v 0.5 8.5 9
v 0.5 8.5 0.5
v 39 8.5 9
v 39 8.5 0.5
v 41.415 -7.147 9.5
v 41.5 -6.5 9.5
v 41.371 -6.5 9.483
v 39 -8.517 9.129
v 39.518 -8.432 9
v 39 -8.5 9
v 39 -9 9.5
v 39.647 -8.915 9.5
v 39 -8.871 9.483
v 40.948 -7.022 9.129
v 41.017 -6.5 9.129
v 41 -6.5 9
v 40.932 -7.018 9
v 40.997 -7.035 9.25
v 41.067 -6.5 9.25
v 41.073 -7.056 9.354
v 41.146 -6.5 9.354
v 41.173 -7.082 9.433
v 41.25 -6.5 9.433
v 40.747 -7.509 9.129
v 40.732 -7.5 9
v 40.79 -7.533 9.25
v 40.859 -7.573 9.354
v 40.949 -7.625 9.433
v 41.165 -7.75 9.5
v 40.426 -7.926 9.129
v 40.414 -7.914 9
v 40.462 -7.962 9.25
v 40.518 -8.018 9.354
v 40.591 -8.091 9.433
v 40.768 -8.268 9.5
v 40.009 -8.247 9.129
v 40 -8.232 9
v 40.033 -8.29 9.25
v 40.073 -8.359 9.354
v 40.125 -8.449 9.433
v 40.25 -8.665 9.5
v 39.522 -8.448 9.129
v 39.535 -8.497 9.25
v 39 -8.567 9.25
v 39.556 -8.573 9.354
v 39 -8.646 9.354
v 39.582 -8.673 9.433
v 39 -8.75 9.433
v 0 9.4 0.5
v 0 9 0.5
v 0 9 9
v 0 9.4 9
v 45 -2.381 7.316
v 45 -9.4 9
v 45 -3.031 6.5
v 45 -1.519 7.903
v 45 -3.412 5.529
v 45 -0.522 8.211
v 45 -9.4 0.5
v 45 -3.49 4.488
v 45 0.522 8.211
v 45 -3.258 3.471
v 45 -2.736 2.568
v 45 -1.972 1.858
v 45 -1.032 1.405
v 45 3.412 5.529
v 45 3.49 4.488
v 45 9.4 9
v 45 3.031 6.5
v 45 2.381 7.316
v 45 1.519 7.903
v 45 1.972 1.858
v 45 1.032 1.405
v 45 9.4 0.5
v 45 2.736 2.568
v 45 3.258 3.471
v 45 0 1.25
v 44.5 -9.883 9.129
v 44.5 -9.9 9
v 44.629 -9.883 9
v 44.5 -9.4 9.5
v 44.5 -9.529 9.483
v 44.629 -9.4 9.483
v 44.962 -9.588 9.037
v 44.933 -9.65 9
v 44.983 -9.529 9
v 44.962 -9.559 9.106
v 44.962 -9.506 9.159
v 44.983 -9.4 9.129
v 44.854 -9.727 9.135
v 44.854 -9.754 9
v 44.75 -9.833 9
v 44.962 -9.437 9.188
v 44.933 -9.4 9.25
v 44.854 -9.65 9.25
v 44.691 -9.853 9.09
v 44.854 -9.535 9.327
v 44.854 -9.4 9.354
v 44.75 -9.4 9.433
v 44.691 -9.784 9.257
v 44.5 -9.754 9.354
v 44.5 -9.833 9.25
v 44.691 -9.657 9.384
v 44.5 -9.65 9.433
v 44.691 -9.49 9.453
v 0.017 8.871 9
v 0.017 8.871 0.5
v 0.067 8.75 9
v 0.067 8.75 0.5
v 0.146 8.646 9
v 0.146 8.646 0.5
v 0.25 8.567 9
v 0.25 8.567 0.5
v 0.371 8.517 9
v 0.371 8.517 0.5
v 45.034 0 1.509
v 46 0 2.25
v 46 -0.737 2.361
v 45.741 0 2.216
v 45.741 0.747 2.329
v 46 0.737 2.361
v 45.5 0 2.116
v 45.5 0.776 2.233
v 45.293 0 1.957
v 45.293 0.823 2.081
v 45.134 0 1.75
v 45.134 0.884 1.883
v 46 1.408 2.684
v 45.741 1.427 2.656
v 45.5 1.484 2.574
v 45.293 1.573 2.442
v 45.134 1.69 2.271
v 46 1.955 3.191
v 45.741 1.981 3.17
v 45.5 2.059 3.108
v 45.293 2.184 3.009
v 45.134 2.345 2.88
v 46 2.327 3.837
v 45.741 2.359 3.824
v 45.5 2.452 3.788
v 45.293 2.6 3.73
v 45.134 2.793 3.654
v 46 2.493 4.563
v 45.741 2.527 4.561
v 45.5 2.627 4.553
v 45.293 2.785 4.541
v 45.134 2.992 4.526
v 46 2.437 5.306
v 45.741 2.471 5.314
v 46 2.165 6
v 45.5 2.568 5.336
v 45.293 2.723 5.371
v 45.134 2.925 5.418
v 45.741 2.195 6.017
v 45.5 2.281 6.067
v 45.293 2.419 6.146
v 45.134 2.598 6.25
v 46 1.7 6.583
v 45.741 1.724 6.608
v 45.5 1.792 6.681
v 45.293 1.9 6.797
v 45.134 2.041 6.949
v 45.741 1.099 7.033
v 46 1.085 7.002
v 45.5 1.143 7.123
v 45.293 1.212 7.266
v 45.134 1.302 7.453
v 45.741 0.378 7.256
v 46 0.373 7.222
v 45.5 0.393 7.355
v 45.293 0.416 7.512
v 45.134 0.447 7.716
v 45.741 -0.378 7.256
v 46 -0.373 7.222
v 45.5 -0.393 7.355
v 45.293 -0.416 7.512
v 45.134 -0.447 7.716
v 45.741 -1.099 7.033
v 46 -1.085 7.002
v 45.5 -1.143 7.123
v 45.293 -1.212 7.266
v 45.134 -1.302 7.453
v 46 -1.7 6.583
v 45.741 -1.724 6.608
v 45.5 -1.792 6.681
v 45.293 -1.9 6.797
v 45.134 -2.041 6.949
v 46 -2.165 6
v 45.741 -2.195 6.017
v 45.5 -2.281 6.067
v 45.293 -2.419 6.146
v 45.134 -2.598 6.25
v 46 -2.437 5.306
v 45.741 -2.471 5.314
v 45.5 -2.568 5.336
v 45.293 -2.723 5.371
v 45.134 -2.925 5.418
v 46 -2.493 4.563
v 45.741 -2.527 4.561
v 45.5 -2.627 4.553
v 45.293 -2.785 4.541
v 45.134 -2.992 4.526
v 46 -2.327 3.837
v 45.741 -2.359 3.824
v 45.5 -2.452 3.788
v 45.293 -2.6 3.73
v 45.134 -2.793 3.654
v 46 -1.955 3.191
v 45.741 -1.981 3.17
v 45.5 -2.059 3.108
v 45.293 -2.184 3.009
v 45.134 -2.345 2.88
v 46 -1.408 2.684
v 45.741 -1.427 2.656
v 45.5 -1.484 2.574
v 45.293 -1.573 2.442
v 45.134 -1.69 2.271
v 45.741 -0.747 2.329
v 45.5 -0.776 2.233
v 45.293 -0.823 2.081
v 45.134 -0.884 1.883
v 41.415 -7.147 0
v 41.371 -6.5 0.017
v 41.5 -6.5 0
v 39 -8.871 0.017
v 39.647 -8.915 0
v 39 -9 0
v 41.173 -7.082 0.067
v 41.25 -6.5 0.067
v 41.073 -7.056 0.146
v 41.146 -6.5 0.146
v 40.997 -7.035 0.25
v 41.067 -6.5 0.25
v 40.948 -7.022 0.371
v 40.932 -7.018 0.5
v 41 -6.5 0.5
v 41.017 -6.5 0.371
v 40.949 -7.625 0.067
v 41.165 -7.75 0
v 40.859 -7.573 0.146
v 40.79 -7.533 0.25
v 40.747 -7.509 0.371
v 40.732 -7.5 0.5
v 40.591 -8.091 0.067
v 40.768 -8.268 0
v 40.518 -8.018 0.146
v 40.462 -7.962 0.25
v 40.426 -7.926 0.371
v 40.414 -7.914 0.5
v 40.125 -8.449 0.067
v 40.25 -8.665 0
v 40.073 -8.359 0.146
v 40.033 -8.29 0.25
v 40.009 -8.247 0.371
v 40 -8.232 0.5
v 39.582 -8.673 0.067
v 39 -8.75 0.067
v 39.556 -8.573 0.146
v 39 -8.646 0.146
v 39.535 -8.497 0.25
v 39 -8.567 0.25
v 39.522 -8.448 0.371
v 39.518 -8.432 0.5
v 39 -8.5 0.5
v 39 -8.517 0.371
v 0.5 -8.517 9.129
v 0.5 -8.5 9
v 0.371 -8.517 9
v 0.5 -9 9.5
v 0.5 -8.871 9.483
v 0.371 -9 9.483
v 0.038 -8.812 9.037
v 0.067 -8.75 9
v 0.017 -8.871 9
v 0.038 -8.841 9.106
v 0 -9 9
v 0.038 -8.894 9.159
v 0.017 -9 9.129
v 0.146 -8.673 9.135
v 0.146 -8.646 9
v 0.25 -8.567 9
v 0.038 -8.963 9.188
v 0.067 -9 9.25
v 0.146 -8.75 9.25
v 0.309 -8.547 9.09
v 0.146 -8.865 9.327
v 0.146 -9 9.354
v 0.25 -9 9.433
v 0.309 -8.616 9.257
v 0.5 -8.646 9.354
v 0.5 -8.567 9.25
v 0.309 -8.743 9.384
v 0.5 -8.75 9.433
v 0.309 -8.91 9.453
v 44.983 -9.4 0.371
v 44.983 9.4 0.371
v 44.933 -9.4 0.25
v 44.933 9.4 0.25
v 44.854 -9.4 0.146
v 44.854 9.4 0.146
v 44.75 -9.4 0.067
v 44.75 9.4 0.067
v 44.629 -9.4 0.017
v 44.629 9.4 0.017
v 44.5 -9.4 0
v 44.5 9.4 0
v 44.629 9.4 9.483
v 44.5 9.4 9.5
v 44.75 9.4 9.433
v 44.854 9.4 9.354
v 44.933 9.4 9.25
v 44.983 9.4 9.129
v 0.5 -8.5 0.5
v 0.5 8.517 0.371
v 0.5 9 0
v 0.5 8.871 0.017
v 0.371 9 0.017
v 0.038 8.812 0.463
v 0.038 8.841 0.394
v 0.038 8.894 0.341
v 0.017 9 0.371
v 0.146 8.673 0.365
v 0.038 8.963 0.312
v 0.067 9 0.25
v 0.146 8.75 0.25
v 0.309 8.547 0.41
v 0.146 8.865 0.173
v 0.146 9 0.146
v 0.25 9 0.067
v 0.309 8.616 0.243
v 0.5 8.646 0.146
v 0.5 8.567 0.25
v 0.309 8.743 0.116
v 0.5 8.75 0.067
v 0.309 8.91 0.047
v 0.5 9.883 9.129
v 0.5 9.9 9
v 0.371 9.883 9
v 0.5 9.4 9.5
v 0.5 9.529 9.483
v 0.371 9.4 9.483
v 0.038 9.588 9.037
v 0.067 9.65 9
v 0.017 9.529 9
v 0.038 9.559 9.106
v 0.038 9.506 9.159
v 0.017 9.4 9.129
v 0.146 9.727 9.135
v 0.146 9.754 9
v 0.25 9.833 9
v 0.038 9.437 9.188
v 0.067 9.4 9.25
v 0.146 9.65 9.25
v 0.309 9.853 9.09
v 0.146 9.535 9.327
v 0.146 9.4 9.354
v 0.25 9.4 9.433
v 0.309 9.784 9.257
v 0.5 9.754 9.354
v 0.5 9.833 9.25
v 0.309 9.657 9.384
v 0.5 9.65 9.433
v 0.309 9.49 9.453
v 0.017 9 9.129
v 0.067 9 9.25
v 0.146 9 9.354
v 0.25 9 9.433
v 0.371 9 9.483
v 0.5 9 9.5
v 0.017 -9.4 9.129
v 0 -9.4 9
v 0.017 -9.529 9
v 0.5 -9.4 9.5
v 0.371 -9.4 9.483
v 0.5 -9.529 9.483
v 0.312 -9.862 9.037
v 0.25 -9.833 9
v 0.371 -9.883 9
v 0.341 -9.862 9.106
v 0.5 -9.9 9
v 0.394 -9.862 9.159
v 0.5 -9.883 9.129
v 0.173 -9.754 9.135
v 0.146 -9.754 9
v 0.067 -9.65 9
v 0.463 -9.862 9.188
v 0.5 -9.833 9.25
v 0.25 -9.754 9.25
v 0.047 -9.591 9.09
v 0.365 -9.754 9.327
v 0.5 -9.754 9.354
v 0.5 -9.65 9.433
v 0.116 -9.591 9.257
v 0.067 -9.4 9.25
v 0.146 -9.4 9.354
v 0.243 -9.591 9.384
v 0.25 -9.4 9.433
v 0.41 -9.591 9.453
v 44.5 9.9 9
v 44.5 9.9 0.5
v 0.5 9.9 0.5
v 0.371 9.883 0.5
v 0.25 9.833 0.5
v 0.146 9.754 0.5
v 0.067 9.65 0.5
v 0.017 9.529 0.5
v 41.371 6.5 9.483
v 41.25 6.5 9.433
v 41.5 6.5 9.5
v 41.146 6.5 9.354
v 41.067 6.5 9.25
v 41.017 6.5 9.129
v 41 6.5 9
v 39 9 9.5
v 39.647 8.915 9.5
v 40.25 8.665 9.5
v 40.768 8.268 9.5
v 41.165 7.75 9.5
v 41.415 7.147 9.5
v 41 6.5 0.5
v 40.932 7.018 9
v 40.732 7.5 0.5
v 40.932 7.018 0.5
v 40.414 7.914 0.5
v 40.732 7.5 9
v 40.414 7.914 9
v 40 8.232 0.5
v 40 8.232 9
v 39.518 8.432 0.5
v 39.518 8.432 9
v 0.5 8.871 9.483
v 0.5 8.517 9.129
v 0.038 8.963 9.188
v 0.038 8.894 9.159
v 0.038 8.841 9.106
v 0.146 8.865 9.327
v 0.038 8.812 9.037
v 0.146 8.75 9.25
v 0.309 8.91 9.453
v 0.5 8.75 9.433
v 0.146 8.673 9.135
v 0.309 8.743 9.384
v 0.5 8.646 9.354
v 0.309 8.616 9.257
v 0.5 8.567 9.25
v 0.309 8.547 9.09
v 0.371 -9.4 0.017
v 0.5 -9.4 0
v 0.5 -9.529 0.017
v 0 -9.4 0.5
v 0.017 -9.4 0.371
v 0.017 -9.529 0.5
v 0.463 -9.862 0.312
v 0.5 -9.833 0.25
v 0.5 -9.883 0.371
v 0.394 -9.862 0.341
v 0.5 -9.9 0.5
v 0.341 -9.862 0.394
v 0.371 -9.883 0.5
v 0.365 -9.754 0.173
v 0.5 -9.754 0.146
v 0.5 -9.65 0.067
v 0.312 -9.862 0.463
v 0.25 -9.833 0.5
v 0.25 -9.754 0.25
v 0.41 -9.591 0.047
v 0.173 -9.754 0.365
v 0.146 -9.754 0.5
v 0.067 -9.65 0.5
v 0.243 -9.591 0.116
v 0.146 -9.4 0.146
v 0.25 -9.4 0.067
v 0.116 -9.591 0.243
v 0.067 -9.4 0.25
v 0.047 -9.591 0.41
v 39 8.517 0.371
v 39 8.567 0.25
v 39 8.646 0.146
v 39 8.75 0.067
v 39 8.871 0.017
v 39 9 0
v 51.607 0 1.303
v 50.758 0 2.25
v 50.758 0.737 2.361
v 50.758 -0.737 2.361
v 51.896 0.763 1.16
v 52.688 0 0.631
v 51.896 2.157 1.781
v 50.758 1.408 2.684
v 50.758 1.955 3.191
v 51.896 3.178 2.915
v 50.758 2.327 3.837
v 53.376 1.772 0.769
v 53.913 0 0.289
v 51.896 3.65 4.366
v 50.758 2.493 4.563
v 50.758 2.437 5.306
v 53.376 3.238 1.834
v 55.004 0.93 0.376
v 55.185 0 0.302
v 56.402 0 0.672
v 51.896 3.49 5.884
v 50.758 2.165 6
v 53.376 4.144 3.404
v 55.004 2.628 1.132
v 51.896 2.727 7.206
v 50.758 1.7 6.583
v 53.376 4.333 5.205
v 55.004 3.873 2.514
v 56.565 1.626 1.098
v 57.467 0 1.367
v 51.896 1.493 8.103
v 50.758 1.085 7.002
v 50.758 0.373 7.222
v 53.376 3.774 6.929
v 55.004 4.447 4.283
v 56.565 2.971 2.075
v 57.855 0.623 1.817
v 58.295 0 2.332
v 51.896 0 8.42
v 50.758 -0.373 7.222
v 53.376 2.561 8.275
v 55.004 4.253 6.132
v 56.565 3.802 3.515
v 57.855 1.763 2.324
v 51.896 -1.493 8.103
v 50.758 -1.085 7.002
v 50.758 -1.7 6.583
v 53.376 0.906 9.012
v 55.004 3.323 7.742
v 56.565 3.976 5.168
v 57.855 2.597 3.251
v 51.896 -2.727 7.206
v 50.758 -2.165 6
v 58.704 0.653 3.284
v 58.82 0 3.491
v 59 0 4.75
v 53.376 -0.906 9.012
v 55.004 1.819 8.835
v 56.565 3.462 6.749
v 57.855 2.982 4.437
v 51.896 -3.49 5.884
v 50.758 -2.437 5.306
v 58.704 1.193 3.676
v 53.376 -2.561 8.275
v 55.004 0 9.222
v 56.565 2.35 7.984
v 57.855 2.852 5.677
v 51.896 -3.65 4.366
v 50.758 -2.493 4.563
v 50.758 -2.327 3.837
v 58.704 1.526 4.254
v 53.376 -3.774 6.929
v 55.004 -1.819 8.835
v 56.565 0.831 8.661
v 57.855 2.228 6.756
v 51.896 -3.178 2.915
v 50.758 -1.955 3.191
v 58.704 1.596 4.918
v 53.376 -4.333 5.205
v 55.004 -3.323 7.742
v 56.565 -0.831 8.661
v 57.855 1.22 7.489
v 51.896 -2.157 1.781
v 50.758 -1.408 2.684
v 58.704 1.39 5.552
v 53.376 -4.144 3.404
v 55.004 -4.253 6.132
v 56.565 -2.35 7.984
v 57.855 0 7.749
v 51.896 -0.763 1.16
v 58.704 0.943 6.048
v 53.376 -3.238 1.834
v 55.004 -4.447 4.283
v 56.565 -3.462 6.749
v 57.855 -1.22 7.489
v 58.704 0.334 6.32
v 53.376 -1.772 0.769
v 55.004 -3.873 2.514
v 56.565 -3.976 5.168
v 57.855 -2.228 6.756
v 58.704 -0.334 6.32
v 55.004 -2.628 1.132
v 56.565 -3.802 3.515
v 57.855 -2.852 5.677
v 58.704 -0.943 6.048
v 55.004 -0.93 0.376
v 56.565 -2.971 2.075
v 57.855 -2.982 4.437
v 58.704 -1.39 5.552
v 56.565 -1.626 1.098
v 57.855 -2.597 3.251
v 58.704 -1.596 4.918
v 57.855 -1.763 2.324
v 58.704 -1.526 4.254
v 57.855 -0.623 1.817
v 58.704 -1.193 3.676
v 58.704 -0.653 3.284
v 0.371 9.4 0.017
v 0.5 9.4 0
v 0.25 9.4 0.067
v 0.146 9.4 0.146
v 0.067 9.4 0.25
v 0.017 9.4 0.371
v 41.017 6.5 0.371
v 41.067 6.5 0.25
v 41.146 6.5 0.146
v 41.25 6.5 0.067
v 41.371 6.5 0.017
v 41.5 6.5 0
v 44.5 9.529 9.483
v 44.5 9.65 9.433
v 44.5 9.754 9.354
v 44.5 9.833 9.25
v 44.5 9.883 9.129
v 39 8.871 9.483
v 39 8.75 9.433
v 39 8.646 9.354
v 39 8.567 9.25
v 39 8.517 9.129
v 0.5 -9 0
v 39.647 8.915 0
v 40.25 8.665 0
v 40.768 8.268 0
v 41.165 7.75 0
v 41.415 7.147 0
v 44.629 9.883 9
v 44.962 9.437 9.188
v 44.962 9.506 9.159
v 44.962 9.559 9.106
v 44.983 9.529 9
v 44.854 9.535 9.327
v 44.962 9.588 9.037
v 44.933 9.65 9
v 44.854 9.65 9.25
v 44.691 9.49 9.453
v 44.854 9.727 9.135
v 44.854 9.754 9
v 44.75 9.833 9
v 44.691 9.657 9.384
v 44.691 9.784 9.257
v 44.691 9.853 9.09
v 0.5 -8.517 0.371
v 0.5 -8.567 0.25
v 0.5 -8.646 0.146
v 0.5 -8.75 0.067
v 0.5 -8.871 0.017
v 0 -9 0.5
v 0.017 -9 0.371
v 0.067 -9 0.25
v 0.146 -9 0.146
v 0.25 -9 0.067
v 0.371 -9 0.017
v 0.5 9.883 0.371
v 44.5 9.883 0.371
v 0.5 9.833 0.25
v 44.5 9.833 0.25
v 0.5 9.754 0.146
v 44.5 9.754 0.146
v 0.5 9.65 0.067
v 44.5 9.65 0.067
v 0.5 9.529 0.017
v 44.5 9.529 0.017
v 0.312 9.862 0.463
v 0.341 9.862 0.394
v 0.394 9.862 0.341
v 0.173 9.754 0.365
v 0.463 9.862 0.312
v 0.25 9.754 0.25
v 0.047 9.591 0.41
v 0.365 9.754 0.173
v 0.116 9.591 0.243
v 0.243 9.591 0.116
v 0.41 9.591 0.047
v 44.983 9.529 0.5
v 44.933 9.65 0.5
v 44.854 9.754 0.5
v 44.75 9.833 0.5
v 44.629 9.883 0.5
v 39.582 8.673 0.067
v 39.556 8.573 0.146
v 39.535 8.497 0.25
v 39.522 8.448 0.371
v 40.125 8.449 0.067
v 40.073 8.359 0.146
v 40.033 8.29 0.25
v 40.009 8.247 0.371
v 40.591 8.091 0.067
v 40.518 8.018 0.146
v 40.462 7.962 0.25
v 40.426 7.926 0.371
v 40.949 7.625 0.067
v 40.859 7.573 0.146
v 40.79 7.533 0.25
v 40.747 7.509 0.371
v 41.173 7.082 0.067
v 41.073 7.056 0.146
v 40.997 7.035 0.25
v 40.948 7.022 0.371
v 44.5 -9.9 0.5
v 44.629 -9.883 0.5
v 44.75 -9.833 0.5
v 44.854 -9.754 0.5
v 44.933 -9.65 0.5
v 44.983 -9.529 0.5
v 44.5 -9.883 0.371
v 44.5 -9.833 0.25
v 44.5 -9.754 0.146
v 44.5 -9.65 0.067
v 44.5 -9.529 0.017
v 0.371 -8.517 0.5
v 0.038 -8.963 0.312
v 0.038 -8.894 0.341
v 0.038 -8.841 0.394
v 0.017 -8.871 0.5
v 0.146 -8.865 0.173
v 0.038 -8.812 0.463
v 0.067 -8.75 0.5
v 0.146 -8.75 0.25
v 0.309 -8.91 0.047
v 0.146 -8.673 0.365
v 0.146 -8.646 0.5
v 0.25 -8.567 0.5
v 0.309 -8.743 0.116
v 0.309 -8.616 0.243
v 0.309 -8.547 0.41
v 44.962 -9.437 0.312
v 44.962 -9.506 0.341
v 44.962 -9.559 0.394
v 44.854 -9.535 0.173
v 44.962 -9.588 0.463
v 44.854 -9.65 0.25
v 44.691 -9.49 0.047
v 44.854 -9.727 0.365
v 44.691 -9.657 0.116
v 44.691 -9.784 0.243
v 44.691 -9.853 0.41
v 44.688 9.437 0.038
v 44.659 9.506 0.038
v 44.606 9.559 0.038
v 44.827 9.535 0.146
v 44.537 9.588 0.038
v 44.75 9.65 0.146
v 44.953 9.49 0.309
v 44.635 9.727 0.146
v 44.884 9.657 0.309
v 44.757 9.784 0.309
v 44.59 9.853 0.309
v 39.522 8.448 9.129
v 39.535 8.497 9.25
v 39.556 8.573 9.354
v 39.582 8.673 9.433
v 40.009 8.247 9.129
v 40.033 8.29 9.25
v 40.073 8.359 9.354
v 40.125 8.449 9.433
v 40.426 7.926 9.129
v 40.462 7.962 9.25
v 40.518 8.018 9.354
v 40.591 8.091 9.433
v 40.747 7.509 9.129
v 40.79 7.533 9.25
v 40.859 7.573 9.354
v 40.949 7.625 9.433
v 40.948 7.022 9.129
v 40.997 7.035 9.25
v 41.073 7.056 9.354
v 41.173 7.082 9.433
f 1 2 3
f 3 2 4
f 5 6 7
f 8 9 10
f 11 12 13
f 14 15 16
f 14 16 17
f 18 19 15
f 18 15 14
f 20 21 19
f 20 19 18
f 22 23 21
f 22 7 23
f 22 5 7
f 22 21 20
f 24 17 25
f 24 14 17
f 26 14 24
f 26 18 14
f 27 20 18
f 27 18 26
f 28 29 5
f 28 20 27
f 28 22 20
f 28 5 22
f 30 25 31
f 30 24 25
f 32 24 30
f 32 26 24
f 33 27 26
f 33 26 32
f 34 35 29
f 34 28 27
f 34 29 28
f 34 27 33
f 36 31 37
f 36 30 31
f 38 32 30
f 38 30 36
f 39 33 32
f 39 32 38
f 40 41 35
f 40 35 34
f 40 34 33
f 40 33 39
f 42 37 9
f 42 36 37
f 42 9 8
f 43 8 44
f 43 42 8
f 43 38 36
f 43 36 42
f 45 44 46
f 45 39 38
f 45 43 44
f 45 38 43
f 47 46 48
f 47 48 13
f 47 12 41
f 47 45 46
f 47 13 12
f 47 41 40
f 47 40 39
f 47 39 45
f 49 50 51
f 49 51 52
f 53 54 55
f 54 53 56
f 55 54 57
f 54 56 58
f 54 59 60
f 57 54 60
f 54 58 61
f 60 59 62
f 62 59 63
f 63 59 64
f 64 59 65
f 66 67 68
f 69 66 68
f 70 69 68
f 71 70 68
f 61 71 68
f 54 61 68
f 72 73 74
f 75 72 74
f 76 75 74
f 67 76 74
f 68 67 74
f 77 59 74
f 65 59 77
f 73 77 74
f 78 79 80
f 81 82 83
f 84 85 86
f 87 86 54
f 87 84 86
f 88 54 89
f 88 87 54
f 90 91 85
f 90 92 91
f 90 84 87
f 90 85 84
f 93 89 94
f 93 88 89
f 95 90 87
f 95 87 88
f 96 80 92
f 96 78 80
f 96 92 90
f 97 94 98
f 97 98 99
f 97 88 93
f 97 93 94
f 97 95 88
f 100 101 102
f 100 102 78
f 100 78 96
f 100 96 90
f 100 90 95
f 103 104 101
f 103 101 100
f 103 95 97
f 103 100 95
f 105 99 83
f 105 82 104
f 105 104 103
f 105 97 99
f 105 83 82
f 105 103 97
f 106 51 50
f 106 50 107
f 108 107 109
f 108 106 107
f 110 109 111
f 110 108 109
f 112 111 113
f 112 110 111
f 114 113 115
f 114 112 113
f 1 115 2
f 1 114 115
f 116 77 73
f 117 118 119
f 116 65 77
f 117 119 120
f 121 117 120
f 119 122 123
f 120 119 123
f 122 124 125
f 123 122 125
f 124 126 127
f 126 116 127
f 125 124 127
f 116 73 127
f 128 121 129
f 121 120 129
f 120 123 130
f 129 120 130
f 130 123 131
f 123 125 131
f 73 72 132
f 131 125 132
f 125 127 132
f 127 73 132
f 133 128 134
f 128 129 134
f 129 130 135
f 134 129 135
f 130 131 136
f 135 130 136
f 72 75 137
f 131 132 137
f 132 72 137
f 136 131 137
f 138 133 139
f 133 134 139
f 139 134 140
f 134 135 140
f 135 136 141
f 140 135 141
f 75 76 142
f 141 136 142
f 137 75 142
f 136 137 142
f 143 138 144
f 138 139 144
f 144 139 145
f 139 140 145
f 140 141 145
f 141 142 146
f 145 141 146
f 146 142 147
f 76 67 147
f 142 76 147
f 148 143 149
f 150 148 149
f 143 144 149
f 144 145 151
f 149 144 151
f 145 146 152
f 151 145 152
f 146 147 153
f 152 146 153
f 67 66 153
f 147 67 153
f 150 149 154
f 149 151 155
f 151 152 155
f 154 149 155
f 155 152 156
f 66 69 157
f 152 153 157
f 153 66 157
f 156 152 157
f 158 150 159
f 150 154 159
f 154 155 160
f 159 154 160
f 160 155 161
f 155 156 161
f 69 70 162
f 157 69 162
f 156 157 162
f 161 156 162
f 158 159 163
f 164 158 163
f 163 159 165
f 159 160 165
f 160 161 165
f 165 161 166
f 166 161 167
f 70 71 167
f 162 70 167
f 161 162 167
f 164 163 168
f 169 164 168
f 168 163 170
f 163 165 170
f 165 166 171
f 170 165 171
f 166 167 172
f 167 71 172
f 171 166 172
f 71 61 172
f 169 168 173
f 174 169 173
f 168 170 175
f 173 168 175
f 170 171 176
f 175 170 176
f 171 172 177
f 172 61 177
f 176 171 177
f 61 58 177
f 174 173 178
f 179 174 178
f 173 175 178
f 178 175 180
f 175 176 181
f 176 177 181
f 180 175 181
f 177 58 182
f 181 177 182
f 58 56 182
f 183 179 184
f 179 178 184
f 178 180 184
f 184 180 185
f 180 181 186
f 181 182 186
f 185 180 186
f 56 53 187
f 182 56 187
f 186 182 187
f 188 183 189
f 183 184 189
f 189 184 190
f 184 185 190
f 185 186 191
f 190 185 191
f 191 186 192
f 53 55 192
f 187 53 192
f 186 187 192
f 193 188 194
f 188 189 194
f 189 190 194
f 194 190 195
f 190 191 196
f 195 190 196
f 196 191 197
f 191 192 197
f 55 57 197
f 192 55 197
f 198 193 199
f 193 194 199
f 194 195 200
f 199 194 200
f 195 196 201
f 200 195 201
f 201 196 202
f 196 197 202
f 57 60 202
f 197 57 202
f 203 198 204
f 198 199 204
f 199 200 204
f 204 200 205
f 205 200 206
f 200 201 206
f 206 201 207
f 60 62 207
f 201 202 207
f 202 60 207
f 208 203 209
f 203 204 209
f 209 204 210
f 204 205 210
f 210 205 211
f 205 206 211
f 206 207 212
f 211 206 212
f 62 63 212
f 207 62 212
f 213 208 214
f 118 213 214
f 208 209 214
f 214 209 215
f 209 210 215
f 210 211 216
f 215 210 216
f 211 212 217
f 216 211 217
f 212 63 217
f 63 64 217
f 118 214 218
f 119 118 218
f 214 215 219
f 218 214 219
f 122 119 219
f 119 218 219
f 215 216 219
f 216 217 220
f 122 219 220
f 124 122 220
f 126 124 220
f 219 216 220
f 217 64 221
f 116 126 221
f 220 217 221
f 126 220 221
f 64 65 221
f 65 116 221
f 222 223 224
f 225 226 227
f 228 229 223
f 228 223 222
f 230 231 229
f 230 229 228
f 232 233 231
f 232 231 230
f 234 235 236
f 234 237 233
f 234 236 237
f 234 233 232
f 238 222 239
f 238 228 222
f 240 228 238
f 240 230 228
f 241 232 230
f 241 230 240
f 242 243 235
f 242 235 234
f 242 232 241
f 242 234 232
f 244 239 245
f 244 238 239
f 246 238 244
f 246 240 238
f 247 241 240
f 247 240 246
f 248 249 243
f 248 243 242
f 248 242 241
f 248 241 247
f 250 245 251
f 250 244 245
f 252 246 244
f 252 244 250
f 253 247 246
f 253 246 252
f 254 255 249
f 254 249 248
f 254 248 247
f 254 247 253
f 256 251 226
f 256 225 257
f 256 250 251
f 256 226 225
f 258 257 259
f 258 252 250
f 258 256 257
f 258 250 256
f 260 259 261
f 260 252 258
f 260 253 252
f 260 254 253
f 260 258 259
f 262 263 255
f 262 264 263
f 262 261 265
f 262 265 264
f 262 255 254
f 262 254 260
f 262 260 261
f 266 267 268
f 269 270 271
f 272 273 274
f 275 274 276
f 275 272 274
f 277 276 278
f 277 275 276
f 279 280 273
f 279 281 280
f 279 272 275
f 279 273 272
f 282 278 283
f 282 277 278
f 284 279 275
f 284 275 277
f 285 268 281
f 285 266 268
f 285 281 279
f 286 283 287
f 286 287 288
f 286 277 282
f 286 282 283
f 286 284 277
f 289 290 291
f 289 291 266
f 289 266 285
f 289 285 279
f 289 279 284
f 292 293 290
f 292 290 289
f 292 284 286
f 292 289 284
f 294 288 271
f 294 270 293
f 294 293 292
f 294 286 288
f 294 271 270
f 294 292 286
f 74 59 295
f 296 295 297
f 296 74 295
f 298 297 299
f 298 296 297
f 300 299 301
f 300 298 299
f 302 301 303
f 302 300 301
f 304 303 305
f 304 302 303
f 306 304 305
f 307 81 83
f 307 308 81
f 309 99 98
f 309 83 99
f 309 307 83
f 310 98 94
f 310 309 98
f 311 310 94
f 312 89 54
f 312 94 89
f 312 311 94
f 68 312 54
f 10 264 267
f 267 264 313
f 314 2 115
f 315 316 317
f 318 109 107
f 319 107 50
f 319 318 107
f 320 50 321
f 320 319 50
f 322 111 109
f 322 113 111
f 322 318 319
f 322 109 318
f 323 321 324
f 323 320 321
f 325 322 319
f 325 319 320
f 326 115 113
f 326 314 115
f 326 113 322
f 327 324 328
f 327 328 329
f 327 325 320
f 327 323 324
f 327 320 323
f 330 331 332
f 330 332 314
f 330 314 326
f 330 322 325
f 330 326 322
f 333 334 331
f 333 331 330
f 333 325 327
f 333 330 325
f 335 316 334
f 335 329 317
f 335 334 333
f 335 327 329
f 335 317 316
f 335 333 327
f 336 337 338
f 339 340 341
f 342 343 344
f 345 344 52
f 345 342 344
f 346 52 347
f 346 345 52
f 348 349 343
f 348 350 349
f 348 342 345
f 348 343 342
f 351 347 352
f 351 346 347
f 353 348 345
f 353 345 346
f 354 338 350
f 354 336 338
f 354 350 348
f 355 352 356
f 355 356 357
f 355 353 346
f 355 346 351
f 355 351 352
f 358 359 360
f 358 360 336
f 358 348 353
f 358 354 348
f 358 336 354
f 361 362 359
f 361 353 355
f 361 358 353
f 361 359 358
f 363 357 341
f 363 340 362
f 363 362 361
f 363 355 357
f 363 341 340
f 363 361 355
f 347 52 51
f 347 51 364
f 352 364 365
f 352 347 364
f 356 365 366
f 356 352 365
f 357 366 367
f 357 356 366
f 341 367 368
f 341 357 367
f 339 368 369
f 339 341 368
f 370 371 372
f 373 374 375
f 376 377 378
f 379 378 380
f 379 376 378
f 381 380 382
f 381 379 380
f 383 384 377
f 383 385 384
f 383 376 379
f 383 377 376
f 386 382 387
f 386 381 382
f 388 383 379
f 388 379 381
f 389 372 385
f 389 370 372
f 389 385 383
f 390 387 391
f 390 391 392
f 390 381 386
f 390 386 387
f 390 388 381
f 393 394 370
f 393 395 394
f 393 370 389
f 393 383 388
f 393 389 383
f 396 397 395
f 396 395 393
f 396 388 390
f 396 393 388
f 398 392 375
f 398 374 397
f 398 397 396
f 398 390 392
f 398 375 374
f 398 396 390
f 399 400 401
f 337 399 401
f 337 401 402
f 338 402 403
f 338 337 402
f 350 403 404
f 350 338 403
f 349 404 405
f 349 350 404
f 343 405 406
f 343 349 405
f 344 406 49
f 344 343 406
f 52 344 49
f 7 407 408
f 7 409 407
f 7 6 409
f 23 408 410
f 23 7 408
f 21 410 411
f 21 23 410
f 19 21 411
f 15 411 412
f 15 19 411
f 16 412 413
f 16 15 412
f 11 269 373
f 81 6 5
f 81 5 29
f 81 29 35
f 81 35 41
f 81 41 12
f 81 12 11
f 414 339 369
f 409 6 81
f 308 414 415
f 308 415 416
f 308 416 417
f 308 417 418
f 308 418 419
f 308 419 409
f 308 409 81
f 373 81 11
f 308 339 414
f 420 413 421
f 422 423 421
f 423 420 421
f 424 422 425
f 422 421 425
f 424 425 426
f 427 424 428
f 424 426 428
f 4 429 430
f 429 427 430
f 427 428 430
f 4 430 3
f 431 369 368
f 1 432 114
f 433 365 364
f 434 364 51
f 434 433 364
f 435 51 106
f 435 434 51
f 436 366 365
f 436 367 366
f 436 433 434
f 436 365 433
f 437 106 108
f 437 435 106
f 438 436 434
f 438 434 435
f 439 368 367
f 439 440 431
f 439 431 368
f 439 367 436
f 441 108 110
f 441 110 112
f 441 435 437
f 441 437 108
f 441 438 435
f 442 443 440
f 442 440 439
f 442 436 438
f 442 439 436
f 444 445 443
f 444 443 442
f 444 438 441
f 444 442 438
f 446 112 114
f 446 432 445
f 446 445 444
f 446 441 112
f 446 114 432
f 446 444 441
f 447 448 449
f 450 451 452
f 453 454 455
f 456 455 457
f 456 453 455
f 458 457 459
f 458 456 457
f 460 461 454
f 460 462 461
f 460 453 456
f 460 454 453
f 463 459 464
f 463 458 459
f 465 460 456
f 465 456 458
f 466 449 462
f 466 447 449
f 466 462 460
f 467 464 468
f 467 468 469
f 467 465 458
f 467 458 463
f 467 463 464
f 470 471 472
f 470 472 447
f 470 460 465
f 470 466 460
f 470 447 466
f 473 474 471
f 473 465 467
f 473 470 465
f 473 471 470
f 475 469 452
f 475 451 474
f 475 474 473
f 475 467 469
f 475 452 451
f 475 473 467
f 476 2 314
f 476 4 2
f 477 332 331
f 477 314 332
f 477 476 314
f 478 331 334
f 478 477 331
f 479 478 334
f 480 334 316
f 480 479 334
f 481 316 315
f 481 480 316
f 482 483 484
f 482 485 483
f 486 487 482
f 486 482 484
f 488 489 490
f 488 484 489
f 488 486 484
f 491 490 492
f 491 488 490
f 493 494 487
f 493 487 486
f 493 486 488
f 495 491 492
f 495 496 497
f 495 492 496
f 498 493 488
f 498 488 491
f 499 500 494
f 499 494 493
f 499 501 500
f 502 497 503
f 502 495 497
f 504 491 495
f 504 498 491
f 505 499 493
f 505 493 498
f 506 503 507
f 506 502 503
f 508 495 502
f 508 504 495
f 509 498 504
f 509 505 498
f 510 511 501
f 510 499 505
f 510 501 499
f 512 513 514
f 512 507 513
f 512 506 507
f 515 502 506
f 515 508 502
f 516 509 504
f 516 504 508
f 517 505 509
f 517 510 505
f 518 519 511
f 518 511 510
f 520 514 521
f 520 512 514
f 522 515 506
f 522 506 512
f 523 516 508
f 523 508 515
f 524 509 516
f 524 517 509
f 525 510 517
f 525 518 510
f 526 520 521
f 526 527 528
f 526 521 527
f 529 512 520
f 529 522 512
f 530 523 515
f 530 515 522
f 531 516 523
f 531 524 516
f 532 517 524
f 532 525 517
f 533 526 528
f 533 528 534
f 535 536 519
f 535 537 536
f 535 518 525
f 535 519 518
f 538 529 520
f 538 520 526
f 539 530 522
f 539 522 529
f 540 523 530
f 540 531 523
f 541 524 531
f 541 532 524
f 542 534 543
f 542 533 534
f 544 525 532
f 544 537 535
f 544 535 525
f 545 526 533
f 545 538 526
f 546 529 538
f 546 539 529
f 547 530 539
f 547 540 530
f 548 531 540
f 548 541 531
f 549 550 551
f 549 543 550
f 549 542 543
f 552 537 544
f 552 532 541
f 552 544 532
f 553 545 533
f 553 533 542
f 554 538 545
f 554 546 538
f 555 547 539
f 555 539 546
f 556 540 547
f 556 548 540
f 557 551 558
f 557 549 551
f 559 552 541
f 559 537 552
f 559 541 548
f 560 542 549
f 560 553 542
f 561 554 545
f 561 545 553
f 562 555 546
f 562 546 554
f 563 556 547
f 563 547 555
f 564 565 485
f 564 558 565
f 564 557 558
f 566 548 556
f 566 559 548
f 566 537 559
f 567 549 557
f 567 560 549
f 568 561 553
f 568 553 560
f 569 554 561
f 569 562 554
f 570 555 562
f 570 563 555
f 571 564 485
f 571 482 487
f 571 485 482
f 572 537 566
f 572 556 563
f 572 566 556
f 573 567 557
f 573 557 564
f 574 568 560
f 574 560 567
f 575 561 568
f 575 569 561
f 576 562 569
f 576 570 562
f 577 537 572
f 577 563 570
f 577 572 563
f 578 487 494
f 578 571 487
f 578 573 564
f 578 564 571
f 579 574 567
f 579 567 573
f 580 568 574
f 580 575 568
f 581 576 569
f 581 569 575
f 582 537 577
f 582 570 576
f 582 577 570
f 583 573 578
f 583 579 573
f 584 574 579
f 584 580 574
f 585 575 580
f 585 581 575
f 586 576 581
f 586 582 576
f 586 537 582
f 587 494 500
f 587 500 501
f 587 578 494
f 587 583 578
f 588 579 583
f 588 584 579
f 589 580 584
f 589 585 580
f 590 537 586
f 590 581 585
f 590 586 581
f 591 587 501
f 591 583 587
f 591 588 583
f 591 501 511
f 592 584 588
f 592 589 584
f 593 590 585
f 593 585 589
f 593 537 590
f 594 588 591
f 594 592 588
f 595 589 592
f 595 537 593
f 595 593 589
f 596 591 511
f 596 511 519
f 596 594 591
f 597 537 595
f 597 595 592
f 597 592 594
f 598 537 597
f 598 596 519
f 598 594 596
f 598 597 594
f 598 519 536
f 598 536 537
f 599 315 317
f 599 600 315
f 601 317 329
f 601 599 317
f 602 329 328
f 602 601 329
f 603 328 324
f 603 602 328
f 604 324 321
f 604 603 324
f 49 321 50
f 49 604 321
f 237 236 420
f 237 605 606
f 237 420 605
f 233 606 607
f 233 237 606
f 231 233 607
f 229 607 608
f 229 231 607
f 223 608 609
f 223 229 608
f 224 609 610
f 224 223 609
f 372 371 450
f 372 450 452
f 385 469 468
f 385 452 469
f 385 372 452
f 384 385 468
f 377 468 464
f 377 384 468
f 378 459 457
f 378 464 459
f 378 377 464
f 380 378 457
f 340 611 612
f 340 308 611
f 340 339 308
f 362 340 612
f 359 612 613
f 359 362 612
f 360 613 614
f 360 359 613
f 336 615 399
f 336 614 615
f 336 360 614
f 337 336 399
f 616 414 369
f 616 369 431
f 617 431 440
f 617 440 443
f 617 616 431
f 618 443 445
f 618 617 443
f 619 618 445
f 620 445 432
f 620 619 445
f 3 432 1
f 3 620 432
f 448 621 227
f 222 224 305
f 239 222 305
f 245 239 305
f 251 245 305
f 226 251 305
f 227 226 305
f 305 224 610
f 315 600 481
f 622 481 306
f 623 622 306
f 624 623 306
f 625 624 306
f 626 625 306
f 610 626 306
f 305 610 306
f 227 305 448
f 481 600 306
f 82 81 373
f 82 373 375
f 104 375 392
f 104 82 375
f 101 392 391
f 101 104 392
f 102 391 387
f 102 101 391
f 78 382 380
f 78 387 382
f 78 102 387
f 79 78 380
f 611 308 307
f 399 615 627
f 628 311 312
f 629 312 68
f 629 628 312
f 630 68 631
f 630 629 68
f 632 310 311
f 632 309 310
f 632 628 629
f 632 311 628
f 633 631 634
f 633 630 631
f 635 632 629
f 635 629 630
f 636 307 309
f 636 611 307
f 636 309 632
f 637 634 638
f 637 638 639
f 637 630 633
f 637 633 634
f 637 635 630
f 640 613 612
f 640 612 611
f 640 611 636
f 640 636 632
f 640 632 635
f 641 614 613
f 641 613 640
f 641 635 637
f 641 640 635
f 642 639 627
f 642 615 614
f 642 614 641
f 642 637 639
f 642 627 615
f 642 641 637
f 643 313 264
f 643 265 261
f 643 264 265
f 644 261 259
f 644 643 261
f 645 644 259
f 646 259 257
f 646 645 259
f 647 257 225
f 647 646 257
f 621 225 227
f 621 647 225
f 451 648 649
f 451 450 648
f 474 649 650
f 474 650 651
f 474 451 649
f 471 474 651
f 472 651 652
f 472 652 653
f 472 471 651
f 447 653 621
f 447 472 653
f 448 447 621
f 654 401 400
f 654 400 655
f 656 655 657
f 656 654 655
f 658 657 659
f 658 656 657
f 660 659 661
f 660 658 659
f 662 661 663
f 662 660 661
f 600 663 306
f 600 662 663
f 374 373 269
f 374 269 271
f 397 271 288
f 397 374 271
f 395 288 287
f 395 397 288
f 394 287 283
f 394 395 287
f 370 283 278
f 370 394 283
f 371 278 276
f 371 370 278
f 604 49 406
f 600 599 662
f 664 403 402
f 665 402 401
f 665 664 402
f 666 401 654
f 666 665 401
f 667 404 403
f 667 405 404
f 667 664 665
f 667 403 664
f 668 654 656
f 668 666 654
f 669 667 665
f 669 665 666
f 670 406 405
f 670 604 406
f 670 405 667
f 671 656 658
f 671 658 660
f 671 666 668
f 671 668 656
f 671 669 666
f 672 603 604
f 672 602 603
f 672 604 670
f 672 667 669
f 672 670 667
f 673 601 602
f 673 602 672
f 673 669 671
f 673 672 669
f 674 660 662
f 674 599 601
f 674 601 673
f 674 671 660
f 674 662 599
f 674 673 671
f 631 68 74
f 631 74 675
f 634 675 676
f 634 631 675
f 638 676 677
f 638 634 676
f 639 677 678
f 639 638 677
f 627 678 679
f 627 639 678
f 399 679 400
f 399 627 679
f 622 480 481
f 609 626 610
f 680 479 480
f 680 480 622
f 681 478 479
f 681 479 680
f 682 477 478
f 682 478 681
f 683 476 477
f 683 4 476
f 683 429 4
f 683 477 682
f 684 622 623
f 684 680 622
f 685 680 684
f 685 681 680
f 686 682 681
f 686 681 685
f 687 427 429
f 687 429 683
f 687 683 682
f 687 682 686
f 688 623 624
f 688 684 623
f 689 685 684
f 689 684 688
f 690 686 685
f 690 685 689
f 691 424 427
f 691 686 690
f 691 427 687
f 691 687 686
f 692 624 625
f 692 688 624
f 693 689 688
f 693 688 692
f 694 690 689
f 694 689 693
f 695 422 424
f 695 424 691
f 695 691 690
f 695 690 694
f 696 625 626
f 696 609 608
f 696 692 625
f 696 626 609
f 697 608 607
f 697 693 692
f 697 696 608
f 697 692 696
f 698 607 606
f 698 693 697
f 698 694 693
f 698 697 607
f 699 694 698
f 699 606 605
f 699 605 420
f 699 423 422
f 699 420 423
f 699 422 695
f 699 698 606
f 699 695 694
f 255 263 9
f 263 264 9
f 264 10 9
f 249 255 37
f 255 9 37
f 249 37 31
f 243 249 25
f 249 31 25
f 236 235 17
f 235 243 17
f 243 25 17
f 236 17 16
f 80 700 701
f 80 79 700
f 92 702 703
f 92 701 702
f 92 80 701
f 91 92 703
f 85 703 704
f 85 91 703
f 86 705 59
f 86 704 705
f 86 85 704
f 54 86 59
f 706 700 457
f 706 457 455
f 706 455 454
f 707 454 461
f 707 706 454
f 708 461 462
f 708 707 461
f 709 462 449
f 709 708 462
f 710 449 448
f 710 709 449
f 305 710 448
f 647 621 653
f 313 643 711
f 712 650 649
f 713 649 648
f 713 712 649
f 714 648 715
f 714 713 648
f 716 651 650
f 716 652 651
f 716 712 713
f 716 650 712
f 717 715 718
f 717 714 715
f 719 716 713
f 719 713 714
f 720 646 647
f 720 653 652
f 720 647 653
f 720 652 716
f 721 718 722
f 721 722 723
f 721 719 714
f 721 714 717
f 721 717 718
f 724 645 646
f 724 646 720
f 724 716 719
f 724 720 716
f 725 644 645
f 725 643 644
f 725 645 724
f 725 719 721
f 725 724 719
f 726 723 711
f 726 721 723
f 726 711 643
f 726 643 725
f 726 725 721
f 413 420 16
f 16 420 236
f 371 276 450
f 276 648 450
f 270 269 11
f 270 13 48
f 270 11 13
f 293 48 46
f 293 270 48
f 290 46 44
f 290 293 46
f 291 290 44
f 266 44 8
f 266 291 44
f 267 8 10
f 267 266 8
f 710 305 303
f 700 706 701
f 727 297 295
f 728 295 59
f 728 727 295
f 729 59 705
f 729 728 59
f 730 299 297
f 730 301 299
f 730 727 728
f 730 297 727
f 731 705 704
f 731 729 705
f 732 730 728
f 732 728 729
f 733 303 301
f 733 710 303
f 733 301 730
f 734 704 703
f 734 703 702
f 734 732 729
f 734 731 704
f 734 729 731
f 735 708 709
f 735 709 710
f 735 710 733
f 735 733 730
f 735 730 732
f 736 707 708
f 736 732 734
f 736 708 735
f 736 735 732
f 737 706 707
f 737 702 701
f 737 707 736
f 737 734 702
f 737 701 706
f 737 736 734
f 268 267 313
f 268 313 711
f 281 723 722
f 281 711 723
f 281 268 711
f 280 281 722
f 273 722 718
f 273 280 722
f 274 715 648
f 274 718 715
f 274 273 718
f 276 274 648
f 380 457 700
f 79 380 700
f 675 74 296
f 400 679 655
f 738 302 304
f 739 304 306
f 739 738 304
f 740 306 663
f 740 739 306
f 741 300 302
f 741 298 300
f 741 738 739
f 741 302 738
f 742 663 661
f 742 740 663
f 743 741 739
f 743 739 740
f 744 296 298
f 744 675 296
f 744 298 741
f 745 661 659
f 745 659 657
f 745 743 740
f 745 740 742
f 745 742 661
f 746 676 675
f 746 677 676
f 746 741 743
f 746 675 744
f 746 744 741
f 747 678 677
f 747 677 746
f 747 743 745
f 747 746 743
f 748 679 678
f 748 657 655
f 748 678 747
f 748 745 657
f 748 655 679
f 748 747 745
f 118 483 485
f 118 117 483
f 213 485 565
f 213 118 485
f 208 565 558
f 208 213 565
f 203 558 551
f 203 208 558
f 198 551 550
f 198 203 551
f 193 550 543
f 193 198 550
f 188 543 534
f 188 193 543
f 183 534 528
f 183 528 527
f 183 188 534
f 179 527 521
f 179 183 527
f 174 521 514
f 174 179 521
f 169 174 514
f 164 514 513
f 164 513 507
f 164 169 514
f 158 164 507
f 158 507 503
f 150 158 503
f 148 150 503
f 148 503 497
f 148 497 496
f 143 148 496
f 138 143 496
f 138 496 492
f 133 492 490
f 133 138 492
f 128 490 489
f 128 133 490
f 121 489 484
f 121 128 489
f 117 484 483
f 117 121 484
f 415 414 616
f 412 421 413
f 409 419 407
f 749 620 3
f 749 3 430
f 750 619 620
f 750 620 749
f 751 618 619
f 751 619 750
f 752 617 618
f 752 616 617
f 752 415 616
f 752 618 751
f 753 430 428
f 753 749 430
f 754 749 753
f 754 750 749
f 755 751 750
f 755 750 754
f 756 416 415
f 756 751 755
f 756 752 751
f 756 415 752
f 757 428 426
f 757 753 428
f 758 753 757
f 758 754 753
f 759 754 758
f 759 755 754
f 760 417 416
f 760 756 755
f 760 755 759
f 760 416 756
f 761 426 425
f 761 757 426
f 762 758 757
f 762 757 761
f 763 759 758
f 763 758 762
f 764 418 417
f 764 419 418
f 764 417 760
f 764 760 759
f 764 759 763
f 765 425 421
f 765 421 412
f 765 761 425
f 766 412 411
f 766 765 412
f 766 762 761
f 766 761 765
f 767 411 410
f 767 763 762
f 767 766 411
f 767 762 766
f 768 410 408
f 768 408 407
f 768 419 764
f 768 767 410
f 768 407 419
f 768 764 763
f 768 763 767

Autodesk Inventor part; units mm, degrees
ref_plane "YZ Plane" through (0, 0, 0) normal (1, 0, 0) x (0, 1, 0)
ref_plane "XZ Plane" through (0, 0, 0) normal (0, 1, 0) x (-1, 0, 0)
sketch "Sketch1" plane through (0, 0, 0) normal (0, 0, 1) x (1, 0, 0)
  line L0 (-9, 0) -> (54, 0) construction
  line L1 (0, -13.86) -> (0, 13.86) construction
  line L2 (0, 8.5) -> (41, 8.5)
  line L3 (41, 8.5) -> (41, -8.5)
  line L4 (41, -8.5) -> (0, -8.5)
  line L5 (0, -9.9) -> (45, -9.9)
  line L6 (45, -9.9) -> (45, 9.9)
  line L7 (45, 9.9) -> (0, 9.9)
  line L8 (0, 8.5) -> (0, 9.9)
  line L9 (0, -8.5) -> (0, -9.9)
  point P0 (0, 0)
  dimension "d0" = 17
  dimension "d1" = 19.8
  dimension "d2" = 45
  dimension "d3" = 4
extrude "Extrusion1" add sketch "Sketch1" along normal blind 9.5
sketch "Sketch2" plane through (45, -9.9, 0) normal (1, 0, 0) x (0, 0, -1)
  line L0 (0, 0) -> (0, 19.8) construction
  line L1 (0, 19.8) -> (-9.5, 19.8) construction
  line L2 (-9.5, 0) -> (-9.5, 19.8) construction
  line L3 (0, 0) -> (-9.5, 0) construction
  line L4 (-9.5, 0) -> (-9.5, 19.8) construction
  line L5 (-9.5, 9.9) -> (0, 9.9) construction
  line L6 (0, 0) -> (-9.5, 0) construction
  line L7 (-4.75, 0) -> (-4.75, 19.8) construction
  circle A0 centre (-4.75, 9.9) radius 2.5
  dimension "d6" = 5
extrude "Extrusion2" add sketch "Sketch2" along normal blind 9.5
ref_plane "Work Plane1" through (0, 0, 0) normal (0, -1, 0) x (1, 0, 0)
sketch "Sketch3" plane through (0, 0, 0) normal (0, -1, 0) x (1, 0, 0)
  line L0 (54.5, 2.25) -> (54.5, 7.25) construction
  line L1 (-11.7, 4.75) -> (70.2, 4.75) construction
  line L2 (54.5, 2.25) -> (54.5, 7.25) construction
  line L3 (45, 7.25) -> (45, 2.25) construction
  arc A0 (50, 4.75) -> (59, 4.75) centre (54.5, 4.75) ccw
  line L4 (59, 4.75) -> (50, 4.75)
  point P0 (0, 0)
  dimension "d9" = 4.5
revolve "Revolution1" add sketch "Sketch3" angle 360 about axis through (45, 0, 4.75) along (1, 0, 0)
fillet "Fillet1" radius 1 1 edges at (45, 0, 7.25)
fillet "Fillet2" radius 2 2 edges at (41, -8.5, 4.75) (41, 8.5, 4.75)
fillet "Fillet3" radius 0.5 22 edges at (22.5, 9.9, 9.5) (41, 0, 9.5) (19.5, -8.5, 9.5) (19.5, 8.5, 9.5) (41, 0, 0) (19.5, -8.5, 0) (19.5, 8.5, 0) (0, 9.2, 0) (0, 9.2, 9.5) (0, -9.2, 9.5) (0, -9.2, 0) (0, -9.9, 4.75) (0, -8.5, 4.75) (22.5, -9.9, 9.5) (22.5, -9.9, 0) (0, 9.9, 4.75) (0, 8.5, 4.75) (45, 9.9, 4.75) (45, 0, 9.5) (45, -9.9, 4.75) (45, 0, 0) (22.5, 9.9, 0)
properties part number "10x20-plunger-V1"
